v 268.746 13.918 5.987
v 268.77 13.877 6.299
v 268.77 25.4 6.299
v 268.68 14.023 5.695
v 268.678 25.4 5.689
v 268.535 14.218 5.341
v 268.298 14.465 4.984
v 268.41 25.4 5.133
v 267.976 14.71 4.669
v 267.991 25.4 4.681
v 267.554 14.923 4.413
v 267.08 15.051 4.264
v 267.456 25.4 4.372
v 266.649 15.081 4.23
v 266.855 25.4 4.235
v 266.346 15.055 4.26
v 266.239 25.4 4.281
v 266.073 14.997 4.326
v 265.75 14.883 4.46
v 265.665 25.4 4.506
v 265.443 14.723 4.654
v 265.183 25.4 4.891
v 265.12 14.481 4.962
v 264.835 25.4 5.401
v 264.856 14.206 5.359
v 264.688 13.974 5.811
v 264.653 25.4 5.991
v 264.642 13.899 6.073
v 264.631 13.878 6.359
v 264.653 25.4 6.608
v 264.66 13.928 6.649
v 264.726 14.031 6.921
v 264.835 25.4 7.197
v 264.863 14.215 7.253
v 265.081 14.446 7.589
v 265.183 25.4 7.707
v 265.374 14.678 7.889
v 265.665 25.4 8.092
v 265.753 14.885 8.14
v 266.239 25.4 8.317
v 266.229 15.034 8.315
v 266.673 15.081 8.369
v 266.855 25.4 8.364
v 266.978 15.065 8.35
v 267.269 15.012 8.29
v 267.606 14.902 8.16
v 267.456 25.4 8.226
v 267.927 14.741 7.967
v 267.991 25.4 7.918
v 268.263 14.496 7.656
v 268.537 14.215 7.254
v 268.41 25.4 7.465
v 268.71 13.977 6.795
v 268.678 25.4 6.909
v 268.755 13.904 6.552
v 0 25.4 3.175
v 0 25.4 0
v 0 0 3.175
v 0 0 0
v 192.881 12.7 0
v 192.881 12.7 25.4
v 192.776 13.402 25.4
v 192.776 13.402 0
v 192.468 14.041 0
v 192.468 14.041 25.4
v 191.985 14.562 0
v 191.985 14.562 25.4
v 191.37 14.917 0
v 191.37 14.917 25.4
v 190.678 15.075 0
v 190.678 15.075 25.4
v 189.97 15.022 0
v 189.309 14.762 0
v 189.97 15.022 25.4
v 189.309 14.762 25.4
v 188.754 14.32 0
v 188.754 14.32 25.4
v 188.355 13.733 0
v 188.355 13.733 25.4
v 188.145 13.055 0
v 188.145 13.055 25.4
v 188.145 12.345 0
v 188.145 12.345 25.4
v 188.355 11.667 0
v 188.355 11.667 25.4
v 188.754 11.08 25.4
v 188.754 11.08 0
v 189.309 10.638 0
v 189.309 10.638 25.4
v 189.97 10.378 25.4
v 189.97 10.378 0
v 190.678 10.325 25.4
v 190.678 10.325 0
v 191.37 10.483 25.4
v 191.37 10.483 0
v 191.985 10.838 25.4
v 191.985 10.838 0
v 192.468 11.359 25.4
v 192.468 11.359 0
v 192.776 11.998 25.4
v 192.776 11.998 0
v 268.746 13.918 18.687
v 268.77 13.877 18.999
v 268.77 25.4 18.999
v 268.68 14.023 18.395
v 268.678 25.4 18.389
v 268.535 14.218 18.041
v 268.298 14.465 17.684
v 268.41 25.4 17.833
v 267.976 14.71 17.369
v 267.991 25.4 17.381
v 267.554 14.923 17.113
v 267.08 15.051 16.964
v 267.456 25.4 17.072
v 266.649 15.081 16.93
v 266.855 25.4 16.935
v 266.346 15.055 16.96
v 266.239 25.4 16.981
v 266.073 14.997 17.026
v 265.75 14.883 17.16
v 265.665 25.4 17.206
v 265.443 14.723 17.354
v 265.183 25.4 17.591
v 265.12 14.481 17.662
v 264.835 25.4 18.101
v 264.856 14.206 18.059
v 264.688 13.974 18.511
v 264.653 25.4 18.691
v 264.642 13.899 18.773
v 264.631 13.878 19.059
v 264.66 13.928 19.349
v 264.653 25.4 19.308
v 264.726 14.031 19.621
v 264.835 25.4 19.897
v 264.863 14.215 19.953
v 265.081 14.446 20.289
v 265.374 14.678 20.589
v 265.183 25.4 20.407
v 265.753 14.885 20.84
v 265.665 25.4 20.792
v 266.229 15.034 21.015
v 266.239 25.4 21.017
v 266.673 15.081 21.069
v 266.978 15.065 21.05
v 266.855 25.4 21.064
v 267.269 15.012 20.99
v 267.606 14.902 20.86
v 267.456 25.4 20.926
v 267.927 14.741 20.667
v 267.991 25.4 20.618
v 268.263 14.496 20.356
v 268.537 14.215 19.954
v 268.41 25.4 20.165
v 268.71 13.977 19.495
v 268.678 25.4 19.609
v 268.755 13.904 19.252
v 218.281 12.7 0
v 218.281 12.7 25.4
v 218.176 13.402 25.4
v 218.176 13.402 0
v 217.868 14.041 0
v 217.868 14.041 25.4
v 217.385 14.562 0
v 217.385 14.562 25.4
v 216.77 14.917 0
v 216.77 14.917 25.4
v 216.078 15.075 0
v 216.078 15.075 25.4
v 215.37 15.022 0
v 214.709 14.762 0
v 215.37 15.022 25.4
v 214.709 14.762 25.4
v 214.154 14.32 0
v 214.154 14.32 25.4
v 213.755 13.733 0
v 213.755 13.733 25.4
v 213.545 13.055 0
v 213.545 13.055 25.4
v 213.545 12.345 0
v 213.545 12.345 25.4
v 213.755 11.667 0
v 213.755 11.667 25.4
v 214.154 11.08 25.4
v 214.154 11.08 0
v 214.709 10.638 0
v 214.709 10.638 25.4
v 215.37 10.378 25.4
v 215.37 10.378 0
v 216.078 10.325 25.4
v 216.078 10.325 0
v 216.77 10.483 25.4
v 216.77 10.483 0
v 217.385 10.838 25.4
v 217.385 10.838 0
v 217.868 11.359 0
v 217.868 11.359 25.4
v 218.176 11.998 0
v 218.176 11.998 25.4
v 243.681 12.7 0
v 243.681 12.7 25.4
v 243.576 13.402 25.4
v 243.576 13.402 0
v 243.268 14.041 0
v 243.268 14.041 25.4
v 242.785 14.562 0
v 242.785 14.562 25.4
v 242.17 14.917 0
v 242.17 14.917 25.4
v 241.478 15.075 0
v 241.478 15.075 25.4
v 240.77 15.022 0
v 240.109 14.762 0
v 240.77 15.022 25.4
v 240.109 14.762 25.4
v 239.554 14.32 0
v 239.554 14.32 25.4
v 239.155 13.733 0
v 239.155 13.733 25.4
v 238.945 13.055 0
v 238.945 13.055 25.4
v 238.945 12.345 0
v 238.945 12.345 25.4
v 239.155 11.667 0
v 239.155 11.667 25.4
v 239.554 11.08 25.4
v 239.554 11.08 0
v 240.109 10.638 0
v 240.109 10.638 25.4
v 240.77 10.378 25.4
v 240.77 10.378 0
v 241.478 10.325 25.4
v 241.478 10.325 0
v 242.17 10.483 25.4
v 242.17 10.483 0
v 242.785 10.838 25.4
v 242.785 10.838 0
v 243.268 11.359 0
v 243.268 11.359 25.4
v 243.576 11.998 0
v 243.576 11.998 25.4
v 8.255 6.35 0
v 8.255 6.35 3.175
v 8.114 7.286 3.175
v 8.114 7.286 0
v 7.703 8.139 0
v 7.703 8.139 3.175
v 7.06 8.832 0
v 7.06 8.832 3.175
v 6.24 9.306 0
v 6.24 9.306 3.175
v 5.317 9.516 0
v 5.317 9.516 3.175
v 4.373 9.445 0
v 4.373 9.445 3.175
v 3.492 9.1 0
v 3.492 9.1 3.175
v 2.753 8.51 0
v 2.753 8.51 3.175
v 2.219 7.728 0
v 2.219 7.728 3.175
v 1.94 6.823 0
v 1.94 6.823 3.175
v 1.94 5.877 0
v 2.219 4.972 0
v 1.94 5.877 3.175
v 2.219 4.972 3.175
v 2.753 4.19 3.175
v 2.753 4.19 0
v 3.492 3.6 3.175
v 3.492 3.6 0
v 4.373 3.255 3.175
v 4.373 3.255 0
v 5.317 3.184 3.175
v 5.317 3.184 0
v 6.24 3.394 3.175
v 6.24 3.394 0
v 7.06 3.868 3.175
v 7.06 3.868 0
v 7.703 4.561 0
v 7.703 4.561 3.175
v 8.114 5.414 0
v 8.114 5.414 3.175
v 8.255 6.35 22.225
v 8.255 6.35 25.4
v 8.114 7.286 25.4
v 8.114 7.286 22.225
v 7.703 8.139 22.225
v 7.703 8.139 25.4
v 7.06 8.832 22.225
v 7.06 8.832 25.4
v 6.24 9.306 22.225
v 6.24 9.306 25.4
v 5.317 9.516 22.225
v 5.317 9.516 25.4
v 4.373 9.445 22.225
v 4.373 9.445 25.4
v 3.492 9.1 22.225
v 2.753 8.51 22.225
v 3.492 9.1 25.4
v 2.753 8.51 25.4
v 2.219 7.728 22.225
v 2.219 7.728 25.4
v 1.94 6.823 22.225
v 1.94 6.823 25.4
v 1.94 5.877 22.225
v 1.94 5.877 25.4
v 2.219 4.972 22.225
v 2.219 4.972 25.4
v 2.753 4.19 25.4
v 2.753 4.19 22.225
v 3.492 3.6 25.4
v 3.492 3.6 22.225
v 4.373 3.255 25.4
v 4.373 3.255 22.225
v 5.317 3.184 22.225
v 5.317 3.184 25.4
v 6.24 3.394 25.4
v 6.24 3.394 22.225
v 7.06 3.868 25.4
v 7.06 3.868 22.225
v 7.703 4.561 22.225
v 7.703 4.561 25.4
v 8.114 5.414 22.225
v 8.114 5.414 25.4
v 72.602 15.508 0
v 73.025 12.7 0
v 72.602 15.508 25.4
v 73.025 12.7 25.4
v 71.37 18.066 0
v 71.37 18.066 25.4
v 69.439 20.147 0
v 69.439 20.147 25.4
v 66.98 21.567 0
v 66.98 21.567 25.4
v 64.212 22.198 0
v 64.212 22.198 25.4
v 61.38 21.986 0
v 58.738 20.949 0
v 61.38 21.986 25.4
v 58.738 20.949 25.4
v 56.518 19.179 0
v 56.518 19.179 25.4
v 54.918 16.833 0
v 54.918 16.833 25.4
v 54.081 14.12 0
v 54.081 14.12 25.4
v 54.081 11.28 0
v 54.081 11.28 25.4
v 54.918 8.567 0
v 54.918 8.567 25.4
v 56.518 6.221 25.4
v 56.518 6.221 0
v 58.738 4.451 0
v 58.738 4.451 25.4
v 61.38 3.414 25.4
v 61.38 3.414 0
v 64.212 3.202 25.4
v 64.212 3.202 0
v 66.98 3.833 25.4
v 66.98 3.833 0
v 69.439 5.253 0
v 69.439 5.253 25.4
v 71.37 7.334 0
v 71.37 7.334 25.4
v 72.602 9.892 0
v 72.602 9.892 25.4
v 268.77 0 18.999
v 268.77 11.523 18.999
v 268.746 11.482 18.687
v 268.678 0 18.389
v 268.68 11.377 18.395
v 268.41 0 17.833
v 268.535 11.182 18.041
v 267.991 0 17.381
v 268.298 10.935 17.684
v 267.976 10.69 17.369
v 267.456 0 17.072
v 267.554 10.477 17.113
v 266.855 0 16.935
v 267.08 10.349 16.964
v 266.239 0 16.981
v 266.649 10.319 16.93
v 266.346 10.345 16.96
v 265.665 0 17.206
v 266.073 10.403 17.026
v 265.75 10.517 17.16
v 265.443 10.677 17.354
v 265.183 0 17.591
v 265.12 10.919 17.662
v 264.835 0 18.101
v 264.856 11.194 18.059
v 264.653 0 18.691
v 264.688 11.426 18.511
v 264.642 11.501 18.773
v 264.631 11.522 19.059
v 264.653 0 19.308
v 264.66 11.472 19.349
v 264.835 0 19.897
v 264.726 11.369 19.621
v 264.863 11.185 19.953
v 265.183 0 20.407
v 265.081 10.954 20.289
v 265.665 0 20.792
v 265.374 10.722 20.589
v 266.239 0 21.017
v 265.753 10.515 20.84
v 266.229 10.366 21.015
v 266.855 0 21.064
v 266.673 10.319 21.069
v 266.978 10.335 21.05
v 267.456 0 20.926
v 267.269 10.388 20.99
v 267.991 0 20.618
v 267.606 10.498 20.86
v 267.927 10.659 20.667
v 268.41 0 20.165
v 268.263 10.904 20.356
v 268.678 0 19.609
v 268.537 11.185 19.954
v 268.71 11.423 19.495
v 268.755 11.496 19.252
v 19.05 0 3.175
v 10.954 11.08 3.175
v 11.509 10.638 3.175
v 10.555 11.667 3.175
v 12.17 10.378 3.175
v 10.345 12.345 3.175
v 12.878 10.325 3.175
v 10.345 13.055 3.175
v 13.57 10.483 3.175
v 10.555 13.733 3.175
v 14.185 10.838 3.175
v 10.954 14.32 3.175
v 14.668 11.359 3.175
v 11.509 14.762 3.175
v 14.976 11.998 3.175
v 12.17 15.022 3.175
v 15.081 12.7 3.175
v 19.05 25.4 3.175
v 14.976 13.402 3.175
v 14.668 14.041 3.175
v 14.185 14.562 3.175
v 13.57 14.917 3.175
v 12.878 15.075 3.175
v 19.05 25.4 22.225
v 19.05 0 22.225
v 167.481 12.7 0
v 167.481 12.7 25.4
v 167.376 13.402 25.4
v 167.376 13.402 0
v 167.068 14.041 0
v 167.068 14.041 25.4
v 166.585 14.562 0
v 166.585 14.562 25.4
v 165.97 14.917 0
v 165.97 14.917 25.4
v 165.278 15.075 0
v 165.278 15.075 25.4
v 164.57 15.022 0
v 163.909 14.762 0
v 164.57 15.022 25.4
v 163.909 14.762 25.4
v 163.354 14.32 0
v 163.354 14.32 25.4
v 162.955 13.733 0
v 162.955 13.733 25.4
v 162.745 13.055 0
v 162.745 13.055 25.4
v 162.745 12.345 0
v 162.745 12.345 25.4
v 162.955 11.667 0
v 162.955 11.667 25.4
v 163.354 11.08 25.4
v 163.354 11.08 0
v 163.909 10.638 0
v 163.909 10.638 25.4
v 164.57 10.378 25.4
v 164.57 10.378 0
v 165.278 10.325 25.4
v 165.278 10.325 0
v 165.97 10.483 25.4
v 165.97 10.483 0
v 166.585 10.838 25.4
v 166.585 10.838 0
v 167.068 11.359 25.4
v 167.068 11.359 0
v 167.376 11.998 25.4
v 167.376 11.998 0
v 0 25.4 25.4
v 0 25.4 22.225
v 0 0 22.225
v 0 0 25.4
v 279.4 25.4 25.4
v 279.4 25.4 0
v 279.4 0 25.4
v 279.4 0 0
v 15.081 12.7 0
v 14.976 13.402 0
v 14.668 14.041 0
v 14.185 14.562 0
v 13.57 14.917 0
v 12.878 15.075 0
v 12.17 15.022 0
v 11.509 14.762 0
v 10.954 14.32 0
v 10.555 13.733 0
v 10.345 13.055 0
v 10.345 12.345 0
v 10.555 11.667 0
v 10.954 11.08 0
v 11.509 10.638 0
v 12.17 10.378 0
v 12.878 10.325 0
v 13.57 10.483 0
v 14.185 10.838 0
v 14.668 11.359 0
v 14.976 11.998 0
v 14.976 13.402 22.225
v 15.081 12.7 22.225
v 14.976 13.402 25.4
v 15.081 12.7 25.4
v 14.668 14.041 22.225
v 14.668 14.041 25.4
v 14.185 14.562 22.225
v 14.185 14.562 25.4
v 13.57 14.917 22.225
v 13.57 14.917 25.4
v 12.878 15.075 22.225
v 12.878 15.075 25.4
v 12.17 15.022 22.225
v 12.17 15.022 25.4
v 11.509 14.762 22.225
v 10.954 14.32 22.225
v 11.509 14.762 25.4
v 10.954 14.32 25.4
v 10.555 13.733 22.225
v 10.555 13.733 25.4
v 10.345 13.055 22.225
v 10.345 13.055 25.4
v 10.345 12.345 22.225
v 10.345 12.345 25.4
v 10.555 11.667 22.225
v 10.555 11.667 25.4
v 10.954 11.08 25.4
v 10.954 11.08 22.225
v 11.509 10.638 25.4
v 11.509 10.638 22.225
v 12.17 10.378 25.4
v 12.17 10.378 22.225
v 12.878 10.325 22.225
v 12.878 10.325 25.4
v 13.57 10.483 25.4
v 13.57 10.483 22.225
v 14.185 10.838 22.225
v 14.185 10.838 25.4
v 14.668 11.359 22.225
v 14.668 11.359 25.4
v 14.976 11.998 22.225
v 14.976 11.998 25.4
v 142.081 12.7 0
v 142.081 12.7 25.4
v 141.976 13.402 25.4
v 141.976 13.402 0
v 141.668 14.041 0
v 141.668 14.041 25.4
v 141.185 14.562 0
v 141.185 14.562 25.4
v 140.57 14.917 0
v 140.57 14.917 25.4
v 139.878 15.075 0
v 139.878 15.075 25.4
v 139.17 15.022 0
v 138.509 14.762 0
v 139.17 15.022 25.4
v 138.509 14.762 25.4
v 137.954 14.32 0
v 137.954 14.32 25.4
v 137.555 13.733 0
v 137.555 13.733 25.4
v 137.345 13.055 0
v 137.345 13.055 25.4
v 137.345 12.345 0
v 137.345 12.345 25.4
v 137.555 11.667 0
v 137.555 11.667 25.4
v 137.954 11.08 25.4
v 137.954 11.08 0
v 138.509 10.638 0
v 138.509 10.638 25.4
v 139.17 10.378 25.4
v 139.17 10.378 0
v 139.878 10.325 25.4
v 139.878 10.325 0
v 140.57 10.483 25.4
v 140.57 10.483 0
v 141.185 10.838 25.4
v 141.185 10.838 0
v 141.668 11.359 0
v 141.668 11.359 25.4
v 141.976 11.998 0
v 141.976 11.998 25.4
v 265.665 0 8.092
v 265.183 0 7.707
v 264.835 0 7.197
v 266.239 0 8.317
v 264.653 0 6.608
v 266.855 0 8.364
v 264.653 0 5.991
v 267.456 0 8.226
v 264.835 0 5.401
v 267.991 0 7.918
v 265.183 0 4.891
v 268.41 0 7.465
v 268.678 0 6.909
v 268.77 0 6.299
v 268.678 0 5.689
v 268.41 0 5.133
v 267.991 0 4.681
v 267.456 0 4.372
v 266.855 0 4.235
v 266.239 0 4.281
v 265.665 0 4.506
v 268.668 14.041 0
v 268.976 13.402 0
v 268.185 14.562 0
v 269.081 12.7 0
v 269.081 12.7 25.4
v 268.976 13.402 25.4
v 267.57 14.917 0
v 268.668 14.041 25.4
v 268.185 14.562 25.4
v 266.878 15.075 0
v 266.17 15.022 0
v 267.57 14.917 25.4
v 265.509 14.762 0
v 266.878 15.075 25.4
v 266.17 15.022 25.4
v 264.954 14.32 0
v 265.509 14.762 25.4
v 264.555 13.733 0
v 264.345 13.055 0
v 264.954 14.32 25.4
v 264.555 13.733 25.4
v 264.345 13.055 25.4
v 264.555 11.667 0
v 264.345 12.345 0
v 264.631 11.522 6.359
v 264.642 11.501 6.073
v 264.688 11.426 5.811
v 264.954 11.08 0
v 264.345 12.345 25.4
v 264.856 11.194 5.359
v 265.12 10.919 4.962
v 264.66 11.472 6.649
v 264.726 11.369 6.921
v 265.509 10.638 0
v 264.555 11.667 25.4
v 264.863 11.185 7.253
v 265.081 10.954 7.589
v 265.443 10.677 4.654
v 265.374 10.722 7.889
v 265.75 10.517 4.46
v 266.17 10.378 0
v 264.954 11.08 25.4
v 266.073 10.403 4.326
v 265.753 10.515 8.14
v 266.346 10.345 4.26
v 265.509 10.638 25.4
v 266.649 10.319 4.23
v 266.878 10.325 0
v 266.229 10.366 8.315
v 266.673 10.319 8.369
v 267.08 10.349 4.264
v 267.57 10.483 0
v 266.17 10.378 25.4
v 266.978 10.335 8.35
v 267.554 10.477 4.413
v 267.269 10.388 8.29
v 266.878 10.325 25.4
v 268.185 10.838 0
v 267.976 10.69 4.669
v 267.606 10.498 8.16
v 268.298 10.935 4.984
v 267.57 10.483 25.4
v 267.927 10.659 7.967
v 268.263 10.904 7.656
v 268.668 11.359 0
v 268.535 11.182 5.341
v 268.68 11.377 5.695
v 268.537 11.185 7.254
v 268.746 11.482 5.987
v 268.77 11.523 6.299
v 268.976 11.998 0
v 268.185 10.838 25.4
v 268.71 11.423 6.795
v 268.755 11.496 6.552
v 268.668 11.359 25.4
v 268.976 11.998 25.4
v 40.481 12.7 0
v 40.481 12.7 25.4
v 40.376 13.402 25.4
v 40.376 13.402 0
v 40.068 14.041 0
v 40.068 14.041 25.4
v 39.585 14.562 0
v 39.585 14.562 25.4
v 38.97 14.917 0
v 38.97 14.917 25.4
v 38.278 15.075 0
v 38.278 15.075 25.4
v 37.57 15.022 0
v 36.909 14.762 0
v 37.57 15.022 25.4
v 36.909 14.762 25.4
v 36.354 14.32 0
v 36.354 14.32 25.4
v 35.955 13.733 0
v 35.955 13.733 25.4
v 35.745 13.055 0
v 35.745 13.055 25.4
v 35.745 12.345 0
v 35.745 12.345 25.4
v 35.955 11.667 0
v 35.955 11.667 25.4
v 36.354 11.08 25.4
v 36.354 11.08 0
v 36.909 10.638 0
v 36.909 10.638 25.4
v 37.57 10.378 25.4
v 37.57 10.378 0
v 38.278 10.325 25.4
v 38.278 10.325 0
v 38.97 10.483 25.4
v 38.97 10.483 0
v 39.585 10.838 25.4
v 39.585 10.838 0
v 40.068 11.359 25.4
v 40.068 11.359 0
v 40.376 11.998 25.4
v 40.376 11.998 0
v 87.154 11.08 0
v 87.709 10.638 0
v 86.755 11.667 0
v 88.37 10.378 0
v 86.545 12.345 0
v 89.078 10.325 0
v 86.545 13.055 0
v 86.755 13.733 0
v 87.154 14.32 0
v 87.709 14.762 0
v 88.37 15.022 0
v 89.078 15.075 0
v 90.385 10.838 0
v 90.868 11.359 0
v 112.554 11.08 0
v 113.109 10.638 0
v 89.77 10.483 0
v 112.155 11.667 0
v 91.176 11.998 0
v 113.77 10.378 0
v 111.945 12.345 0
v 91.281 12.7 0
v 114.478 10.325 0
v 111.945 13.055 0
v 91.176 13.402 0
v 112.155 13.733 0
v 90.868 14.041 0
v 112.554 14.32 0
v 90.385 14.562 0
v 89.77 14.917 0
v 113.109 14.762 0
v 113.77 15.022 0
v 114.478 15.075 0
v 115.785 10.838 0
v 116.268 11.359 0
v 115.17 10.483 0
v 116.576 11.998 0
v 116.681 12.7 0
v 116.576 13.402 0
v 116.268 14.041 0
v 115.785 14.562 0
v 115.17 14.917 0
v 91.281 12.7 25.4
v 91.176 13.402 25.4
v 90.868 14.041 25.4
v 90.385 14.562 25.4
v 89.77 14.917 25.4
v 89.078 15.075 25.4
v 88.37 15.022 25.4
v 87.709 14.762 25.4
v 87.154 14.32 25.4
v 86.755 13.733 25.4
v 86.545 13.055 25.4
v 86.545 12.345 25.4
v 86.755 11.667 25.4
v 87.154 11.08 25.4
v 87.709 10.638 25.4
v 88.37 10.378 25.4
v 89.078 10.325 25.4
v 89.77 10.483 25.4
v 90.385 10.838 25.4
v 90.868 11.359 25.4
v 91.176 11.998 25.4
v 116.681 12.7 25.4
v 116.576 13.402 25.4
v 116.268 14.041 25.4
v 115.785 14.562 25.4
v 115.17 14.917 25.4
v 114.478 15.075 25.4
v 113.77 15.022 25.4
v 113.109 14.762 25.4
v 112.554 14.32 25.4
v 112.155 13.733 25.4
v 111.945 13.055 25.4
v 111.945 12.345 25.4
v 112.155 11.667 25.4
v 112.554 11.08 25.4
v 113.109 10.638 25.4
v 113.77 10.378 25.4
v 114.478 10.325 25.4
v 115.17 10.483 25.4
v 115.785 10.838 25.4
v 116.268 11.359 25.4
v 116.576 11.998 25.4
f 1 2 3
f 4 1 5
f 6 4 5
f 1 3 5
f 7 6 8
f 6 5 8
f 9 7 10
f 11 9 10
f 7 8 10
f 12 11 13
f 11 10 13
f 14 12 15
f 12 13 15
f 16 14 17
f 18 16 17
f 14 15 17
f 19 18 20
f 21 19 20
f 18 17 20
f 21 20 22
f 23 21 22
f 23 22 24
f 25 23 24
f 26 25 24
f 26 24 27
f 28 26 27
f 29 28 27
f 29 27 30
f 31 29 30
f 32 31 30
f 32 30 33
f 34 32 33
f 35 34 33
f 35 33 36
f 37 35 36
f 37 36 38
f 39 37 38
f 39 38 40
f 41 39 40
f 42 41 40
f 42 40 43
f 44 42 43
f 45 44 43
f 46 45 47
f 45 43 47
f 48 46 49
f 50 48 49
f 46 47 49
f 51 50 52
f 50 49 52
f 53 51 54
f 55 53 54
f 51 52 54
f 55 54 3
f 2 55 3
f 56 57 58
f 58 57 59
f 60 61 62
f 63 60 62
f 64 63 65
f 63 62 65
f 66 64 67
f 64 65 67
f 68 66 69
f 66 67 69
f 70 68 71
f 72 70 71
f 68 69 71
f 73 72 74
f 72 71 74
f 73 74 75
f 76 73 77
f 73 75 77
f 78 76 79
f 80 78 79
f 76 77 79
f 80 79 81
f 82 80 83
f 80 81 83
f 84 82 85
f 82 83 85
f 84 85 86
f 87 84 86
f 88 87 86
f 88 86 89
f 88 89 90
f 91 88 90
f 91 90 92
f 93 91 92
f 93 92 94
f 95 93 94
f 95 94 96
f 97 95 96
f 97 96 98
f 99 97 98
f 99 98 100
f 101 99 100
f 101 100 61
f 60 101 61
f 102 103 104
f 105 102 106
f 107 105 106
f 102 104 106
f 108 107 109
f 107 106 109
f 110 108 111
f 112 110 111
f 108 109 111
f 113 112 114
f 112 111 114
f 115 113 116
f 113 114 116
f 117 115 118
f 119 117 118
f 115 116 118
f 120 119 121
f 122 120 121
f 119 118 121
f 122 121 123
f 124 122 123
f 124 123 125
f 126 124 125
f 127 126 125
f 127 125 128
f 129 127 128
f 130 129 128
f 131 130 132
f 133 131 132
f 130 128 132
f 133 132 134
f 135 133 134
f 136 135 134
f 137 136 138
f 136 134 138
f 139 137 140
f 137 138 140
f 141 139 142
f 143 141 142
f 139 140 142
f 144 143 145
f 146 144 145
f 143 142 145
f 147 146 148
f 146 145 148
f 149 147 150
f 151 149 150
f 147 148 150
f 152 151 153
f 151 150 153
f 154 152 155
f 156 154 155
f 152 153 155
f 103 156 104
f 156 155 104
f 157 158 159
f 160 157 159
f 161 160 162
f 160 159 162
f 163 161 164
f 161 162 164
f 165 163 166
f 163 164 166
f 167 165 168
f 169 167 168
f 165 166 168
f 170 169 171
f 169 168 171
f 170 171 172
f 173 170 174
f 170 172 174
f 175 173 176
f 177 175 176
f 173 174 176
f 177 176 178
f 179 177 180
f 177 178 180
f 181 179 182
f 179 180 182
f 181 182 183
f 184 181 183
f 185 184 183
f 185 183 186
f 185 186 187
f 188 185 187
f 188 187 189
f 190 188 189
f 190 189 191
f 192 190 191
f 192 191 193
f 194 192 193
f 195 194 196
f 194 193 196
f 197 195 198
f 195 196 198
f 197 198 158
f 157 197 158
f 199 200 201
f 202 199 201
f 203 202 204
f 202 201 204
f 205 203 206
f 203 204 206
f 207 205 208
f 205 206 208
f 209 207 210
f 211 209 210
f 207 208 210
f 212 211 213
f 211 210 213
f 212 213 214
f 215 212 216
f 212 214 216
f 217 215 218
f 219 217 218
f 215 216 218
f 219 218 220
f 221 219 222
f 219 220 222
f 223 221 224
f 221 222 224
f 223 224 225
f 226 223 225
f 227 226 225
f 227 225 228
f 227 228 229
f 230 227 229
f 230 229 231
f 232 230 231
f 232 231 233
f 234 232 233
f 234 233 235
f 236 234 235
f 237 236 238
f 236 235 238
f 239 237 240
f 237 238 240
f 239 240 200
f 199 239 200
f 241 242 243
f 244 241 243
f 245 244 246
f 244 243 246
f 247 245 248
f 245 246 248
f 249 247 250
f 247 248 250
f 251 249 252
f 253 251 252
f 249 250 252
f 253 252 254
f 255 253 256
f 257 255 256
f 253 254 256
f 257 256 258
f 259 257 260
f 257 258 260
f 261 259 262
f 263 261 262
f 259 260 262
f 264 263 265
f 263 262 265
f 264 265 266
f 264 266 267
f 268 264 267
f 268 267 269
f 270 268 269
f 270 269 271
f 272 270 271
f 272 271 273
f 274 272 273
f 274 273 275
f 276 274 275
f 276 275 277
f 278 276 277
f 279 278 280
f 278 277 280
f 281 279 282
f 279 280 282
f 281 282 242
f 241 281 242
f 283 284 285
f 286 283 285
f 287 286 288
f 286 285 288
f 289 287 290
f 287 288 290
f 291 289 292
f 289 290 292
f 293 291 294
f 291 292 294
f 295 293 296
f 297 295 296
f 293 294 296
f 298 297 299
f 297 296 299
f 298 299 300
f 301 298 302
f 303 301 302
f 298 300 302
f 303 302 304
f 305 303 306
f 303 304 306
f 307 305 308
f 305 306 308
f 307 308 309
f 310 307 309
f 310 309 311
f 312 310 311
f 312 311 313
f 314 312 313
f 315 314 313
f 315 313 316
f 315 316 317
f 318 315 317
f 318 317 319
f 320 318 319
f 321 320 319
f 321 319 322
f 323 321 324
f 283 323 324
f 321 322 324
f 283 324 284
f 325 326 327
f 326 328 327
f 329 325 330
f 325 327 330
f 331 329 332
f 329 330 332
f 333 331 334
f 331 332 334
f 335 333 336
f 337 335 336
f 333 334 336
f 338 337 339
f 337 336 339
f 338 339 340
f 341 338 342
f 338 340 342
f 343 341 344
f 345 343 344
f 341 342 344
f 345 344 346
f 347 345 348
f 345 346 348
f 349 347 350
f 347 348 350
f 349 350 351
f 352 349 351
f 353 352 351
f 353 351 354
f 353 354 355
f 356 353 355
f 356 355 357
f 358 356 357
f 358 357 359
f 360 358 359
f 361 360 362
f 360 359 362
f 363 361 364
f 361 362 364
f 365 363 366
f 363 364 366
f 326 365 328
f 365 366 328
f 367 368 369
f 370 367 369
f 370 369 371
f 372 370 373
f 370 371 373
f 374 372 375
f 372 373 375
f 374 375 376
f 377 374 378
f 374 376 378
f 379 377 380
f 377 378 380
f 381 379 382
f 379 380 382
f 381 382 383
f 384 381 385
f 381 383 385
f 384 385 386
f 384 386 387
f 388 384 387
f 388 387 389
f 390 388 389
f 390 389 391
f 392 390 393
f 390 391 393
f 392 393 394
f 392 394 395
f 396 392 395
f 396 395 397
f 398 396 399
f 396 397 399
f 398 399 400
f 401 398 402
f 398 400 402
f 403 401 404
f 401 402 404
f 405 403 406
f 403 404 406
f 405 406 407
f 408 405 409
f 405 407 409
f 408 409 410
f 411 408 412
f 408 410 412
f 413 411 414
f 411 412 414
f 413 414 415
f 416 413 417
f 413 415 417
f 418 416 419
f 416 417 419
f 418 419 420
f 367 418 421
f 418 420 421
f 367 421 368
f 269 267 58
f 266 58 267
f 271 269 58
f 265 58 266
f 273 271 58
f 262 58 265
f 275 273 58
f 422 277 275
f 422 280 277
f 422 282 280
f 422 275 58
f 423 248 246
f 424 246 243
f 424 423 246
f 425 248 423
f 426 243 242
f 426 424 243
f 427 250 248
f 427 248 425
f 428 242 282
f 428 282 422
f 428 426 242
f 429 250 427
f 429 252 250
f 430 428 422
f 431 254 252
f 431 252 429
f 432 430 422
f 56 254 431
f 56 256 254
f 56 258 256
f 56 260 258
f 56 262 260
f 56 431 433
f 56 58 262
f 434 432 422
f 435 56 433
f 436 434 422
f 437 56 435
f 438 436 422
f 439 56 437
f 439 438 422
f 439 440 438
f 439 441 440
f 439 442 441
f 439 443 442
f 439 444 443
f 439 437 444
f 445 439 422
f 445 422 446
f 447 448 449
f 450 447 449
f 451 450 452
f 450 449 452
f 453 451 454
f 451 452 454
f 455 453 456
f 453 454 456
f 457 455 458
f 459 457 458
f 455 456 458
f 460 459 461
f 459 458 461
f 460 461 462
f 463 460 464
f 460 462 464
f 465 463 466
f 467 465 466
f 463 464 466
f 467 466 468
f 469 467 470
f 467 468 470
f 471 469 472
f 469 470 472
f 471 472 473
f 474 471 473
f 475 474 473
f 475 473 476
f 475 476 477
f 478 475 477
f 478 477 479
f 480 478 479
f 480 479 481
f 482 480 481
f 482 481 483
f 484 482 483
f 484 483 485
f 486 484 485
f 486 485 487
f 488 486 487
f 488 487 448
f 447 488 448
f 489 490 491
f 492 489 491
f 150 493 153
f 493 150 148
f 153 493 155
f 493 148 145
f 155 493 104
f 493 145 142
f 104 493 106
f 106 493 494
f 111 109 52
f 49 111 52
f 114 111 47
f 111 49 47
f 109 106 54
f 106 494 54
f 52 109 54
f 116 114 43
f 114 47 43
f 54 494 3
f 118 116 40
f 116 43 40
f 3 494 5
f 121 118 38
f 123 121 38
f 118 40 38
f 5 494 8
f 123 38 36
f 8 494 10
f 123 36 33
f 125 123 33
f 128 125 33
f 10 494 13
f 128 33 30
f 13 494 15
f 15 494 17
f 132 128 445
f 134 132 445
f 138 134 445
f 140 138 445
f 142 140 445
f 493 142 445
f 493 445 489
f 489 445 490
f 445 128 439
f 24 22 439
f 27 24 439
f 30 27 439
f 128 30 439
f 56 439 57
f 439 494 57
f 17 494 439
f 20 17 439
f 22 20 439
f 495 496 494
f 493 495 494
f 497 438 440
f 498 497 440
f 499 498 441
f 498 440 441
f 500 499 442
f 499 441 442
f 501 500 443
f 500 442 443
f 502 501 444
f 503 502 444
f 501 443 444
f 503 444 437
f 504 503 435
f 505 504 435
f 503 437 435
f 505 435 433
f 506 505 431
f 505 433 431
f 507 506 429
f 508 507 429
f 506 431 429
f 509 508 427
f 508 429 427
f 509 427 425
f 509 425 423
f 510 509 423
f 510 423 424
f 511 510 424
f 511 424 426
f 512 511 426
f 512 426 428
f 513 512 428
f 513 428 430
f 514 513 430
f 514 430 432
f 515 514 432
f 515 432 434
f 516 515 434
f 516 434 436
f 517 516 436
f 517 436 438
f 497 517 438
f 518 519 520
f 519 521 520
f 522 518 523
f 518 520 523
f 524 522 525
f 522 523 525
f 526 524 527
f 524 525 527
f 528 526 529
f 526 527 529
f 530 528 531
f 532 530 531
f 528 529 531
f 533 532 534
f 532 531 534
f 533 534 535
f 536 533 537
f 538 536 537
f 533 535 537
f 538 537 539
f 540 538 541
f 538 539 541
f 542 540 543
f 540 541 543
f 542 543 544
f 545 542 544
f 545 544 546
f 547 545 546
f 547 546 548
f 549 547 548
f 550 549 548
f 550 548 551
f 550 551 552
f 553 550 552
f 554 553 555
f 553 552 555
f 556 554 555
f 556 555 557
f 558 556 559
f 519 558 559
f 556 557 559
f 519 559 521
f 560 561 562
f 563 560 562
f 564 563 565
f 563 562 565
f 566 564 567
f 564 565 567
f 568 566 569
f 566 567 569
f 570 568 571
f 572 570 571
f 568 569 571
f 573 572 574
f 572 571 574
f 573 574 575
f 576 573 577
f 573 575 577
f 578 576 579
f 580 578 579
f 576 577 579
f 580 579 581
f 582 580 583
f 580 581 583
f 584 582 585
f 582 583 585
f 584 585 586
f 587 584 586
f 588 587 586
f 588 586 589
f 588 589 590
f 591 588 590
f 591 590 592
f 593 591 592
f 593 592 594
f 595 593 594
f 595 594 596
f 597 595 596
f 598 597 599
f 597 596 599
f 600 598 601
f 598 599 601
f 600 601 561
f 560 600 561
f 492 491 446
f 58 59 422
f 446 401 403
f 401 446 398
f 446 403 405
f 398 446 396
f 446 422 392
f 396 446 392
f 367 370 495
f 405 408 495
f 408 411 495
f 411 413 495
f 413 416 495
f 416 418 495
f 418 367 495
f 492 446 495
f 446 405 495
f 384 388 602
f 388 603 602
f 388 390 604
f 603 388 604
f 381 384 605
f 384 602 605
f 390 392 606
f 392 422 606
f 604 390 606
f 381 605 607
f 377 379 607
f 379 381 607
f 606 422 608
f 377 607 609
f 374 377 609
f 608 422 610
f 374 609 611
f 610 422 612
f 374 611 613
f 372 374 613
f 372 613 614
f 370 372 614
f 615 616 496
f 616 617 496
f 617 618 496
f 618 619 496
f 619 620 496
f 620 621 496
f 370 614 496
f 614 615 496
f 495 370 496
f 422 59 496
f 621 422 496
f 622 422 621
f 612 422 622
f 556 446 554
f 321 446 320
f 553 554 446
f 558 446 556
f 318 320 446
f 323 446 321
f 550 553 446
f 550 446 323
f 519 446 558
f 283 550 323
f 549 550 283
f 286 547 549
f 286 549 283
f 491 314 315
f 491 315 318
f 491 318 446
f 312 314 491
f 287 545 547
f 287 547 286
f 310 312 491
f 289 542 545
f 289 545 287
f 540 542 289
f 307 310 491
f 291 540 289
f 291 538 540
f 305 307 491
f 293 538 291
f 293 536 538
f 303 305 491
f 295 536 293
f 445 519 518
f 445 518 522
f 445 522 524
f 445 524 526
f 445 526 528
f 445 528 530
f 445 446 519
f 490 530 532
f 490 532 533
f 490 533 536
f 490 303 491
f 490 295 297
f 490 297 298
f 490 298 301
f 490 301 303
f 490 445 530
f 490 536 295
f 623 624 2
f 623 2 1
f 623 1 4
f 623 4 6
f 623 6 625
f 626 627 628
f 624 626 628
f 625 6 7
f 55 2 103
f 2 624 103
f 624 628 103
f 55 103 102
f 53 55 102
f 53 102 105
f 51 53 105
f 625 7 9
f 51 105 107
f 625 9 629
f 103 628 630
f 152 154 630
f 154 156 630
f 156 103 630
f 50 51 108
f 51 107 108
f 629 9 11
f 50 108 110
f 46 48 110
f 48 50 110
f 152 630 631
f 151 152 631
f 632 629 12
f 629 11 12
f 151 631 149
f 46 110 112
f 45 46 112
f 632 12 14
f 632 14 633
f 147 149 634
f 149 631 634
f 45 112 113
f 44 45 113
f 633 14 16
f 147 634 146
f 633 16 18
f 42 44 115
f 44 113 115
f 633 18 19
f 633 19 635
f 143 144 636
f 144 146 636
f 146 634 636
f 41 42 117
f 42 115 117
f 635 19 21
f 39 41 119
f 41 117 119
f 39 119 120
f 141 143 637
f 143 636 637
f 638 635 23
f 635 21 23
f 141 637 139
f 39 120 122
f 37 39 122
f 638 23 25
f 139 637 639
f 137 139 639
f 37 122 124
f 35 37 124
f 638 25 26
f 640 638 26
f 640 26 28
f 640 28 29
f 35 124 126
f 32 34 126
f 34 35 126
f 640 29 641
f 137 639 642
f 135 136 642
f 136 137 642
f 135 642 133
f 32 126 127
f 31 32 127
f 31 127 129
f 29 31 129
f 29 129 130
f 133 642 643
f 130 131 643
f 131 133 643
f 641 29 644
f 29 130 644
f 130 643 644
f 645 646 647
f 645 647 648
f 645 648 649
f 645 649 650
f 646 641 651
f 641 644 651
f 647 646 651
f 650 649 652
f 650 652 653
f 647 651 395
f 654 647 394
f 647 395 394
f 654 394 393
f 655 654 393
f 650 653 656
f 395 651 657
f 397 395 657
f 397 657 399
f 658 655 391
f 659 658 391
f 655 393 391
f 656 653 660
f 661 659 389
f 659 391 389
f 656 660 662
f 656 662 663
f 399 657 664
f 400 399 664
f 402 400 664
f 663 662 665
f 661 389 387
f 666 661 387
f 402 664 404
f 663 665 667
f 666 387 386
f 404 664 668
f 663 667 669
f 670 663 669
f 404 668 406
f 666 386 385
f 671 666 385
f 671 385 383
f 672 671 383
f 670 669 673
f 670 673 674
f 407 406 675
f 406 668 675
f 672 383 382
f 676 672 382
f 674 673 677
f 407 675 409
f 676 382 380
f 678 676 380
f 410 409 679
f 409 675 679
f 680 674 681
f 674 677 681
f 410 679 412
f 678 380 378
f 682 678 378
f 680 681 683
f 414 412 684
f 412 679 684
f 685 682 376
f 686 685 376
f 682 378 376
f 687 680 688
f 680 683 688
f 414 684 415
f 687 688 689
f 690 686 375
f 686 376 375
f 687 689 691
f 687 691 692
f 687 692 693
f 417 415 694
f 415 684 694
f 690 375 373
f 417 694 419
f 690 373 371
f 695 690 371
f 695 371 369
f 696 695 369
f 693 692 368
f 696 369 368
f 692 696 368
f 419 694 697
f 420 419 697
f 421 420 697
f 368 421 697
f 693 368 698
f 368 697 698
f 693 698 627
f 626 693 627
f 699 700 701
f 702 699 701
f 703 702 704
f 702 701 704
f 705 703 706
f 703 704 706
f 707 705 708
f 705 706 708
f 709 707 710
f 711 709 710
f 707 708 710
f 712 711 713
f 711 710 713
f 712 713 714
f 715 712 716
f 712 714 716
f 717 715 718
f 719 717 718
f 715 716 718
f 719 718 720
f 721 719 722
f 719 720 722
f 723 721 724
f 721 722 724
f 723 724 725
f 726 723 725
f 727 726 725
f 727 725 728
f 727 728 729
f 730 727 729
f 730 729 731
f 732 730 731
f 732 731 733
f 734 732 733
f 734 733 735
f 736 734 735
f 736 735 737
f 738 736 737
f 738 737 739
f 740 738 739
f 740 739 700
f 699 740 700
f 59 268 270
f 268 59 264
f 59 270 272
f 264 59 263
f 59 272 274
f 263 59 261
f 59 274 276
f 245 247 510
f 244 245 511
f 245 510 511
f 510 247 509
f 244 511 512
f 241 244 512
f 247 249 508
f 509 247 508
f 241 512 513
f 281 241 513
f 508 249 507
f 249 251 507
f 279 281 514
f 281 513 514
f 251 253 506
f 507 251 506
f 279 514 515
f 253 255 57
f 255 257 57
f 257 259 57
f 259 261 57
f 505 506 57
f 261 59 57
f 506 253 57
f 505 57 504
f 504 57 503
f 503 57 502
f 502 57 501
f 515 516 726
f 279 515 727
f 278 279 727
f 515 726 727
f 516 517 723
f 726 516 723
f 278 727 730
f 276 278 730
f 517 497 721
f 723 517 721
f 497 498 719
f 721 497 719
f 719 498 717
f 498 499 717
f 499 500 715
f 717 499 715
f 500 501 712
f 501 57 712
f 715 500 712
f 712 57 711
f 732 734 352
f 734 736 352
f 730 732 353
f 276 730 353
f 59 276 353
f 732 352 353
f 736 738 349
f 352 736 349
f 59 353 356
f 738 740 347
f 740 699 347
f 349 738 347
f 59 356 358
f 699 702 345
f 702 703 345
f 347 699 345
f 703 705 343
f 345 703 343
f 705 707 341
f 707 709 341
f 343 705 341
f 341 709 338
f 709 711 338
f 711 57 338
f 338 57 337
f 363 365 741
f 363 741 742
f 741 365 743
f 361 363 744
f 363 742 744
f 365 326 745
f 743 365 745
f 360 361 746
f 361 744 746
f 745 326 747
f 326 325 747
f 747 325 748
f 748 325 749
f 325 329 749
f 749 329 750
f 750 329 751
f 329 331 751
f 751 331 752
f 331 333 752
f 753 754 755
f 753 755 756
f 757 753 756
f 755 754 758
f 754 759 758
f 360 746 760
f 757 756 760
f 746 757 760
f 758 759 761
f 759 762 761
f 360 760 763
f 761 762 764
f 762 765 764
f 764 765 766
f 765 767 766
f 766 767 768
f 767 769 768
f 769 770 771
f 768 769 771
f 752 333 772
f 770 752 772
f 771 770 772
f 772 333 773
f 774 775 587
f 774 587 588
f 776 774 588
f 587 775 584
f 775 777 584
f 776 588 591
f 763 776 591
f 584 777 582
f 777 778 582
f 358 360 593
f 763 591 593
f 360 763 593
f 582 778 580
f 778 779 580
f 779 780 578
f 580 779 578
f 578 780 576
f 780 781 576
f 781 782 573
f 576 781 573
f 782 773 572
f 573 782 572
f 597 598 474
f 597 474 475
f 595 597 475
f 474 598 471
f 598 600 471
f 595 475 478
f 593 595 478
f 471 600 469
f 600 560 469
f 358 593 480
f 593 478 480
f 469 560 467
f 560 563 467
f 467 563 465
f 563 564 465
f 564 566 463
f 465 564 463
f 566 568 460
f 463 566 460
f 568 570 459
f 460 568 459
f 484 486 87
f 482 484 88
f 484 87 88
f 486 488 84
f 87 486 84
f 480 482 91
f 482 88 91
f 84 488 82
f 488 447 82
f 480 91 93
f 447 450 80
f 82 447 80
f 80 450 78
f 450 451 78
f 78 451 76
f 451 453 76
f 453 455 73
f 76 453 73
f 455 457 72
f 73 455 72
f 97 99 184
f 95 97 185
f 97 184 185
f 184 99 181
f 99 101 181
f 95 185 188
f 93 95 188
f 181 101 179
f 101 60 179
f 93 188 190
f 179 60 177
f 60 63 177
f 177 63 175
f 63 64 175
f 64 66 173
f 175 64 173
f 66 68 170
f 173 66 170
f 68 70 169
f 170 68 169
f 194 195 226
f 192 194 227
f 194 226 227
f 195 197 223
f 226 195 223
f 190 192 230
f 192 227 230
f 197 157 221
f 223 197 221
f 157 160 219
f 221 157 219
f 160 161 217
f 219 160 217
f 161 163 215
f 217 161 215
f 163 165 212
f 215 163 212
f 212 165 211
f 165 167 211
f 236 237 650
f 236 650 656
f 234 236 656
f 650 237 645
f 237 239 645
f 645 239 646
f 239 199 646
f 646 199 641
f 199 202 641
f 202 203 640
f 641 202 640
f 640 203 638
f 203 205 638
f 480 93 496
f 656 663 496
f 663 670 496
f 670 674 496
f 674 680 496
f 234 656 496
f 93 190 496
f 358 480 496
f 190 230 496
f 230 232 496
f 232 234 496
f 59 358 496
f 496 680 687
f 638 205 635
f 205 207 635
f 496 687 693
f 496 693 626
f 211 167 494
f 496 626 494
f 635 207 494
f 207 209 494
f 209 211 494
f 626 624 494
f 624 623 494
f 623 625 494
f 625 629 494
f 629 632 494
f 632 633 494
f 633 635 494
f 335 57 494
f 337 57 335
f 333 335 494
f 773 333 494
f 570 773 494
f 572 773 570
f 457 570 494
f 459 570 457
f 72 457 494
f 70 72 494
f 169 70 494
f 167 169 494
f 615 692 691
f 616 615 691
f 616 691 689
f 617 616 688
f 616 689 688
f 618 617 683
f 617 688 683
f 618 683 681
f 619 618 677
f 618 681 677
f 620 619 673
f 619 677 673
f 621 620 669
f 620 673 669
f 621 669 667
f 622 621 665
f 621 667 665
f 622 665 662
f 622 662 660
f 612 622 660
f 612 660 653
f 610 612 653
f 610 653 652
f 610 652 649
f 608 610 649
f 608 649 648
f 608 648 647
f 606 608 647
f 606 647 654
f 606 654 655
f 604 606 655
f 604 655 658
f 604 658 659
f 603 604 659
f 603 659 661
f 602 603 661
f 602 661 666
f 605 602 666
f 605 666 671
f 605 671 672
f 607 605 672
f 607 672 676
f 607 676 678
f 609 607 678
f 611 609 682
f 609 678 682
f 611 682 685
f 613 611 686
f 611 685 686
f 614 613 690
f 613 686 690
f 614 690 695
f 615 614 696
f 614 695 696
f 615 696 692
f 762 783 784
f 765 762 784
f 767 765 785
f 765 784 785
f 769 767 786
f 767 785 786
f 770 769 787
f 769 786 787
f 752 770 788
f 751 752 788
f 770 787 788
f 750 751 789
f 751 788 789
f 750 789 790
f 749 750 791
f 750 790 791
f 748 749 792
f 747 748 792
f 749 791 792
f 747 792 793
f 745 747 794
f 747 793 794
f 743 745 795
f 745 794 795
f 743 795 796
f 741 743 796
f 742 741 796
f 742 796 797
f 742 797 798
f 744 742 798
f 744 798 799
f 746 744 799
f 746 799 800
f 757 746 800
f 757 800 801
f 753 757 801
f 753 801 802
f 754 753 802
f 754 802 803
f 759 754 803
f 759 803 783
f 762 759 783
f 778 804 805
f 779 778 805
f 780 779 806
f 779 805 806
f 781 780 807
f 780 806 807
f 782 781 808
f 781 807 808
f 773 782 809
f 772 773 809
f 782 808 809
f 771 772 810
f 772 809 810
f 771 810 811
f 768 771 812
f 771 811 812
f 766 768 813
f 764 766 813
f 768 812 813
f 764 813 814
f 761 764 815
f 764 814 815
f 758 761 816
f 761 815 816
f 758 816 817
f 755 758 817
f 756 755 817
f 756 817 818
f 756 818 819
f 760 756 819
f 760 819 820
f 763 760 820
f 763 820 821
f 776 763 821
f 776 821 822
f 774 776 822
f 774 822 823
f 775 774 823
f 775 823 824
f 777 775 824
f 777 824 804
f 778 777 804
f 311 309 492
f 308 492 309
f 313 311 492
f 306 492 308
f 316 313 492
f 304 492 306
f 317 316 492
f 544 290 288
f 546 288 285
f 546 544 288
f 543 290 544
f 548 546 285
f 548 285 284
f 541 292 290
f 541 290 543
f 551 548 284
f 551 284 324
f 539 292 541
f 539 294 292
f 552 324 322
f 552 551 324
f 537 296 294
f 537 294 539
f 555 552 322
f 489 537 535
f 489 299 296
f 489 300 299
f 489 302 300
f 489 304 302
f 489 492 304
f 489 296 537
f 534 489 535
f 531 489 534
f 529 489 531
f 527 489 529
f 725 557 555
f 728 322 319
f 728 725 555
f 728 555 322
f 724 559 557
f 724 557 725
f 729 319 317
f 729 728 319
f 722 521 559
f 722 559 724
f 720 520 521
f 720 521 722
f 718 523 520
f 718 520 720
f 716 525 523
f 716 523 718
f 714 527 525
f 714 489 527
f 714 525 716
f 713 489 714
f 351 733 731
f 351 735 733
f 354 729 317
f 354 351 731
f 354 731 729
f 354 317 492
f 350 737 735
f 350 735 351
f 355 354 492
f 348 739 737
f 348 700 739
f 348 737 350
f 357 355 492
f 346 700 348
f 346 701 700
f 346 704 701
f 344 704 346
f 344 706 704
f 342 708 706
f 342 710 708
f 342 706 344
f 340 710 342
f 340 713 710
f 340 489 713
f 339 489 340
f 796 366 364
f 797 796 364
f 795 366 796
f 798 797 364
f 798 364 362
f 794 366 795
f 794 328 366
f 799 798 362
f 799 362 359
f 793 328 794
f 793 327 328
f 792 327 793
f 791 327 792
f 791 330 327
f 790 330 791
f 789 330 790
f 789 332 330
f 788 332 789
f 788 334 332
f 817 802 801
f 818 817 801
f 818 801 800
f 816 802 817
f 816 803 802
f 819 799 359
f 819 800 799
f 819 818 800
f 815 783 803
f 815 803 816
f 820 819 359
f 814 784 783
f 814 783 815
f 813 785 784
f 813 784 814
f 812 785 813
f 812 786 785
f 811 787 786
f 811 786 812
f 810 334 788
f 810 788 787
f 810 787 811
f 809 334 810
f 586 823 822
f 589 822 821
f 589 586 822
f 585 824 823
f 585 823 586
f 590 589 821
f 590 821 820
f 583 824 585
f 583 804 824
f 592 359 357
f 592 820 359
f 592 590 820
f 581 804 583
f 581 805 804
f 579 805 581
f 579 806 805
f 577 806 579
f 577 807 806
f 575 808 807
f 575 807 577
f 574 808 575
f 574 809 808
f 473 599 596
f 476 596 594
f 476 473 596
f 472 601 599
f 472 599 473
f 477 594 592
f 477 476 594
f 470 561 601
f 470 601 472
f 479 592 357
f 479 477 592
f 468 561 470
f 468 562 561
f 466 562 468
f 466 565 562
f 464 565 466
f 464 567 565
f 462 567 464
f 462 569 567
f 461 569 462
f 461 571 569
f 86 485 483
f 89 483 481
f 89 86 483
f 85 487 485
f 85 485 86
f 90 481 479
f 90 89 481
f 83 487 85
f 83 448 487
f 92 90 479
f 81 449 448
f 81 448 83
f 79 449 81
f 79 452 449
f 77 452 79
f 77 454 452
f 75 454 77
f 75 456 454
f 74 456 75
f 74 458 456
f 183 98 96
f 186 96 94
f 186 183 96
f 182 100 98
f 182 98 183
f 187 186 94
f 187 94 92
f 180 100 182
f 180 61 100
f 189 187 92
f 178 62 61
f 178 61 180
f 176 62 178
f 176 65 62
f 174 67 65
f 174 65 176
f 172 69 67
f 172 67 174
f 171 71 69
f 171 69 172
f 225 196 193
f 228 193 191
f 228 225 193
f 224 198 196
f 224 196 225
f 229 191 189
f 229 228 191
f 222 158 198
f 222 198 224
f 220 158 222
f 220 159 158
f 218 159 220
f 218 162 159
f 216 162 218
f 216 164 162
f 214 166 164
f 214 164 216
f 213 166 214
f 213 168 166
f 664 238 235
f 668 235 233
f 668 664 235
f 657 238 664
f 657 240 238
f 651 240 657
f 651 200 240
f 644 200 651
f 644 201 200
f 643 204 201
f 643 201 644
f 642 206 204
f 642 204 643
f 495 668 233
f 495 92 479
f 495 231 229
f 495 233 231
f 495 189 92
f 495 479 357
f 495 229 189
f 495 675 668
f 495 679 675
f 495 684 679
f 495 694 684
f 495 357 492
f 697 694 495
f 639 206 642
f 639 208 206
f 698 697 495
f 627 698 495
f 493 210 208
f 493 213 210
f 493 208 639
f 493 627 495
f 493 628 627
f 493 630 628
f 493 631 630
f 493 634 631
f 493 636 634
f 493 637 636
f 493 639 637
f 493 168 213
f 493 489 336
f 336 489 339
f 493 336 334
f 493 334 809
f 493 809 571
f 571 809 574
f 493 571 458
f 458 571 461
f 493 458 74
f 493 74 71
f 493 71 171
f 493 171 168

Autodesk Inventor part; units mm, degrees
ref_plane "YZ Plane" through (0, 0, 0) normal (1, 0, 0) x (0, 1, 0)
ref_plane "XZ Plane" through (0, 0, 0) normal (0, 1, 0) x (-1, 0, 0)
ref_plane "XY Plane" through (0, 0, 0) normal (0, 0, 1) x (1, 0, 0)
sketch "Sketch1" plane through (0, 0, 0) normal (0, 0, 1) x (1, 0, 0)
  line L0 (0, 0) -> (279.4, 0)
  line L1 (279.4, 0) -> (279.4, 25.4)
  line L2 (279.4, 25.4) -> (0, 25.4)
  line L3 (0, 25.4) -> (0, 0)
  dimension "d0" = 279.4
  dimension "d1" = 25.4
extrude "Extrusion1" add sketch "Sketch1" along normal blind 25.4
sketch "Sketch4" plane through (0, 0, 25.4) normal (0, 0, 1) x (1, 0, 0)
  circle A0 centre (12.7, 12.7) radius 2.3813
  line L0 (0, 0) -> (279.4, 0) projected
  line L1 (0, 25.4) -> (0, 0) projected
  circle A1 centre (38.1, 12.7) radius 2.3813
  circle A2 centre (63.5, 12.7) radius 2.3813
  circle A3 centre (88.9, 12.7) radius 2.3813
  circle A4 centre (114.3, 12.7) radius 2.3813
  circle A5 centre (139.7, 12.7) radius 2.3813
  circle A6 centre (165.1, 12.7) radius 2.3813
  circle A7 centre (190.5, 12.7) radius 2.3813
  circle A8 centre (215.9, 12.7) radius 2.3813
  circle A9 centre (241.3, 12.7) radius 2.3813
  circle A10 centre (266.7, 12.7) radius 2.3813
  circle A11 centre (292.1, 12.7) radius 2.3813
  circle A12 centre (317.5, 12.7) radius 2.3813
  circle A13 centre (63.5, 12.7) radius 9.525
  circle A14 centre (5.08, 6.35) radius 3.175
  dimension "d17" = 4.7625
  dimension "d18" = 12.7
  dimension "d19" = 12.7
  dimension "d22" = 25.4
  dimension "d37" = 19.05
  dimension "d46" = 6.35
  dimension "d48" = 6.35
  dimension "d49" = 58.42
extrude "Extrusion4" cut sketch "Sketch4" against normal blind 25.4 contours A0 | A1 | A2 | A3 | A4 | A5 | A6 | A7 | A8 | A9 | A10 | A11 | A12 | A13 | A14
sketch "Sketch6" plane through (0, 25.4, 0) normal (0, 1, 0) x (1, 0, 0)
  line L0 (19.05, -22.225) -> (0, -22.225)
  line L1 (0, -22.225) -> (0, -3.175)
  line L2 (0, -3.175) -> (19.05, -3.175)
  line L3 (19.05, -3.175) -> (19.05, -22.225)
  line L4 (279.4, 0) -> (279.4, -25.4) projected
  line L5 (279.4, -25.4) -> (0, -25.4) projected
  line L6 (279.4, 0) -> (0, 0) projected
  line L7 (0, 0) -> (0, -25.4) projected
  dimension "d38" = 19.05
  dimension "d41" = 3.175
  dimension "d42" = 3.175
  dimension "d45" = 0
extrude "Extrusion6" cut sketch "Sketch6" against normal blind 25.4 contours L0 L1 L2 L3
sketch "Sketch7" plane through (0, 25.4, 0) normal (0, 1, 0) x (1, 0, 0)
  circle A0 centre (266.7, -18.9992) radius 2.0701
  circle A1 centre (266.7, -6.2992) radius 2.0701
  line L0 (279.4, 0) -> (279.4, -25.4) projected
  line L1 (279.4, 0) -> (0, 0) projected
  line L2 (279.4, -25.4) -> (0, -25.4) projected
  dimension "d50" = 4.1402
  dimension "d51" = 4.1402
  dimension "d52" = 12.7
  dimension "d53" = 12.7
  dimension "d54" = 12.7
  dimension "d58" = 6.4008
extrude "Extrusion7" cut sketch "Sketch7" against normal blind 25.4
equation "\"d42\" = d41"
equation "\"d51\" = d50"
equation "\"d53\" = d54"
properties part number "RobotArm Arm"
